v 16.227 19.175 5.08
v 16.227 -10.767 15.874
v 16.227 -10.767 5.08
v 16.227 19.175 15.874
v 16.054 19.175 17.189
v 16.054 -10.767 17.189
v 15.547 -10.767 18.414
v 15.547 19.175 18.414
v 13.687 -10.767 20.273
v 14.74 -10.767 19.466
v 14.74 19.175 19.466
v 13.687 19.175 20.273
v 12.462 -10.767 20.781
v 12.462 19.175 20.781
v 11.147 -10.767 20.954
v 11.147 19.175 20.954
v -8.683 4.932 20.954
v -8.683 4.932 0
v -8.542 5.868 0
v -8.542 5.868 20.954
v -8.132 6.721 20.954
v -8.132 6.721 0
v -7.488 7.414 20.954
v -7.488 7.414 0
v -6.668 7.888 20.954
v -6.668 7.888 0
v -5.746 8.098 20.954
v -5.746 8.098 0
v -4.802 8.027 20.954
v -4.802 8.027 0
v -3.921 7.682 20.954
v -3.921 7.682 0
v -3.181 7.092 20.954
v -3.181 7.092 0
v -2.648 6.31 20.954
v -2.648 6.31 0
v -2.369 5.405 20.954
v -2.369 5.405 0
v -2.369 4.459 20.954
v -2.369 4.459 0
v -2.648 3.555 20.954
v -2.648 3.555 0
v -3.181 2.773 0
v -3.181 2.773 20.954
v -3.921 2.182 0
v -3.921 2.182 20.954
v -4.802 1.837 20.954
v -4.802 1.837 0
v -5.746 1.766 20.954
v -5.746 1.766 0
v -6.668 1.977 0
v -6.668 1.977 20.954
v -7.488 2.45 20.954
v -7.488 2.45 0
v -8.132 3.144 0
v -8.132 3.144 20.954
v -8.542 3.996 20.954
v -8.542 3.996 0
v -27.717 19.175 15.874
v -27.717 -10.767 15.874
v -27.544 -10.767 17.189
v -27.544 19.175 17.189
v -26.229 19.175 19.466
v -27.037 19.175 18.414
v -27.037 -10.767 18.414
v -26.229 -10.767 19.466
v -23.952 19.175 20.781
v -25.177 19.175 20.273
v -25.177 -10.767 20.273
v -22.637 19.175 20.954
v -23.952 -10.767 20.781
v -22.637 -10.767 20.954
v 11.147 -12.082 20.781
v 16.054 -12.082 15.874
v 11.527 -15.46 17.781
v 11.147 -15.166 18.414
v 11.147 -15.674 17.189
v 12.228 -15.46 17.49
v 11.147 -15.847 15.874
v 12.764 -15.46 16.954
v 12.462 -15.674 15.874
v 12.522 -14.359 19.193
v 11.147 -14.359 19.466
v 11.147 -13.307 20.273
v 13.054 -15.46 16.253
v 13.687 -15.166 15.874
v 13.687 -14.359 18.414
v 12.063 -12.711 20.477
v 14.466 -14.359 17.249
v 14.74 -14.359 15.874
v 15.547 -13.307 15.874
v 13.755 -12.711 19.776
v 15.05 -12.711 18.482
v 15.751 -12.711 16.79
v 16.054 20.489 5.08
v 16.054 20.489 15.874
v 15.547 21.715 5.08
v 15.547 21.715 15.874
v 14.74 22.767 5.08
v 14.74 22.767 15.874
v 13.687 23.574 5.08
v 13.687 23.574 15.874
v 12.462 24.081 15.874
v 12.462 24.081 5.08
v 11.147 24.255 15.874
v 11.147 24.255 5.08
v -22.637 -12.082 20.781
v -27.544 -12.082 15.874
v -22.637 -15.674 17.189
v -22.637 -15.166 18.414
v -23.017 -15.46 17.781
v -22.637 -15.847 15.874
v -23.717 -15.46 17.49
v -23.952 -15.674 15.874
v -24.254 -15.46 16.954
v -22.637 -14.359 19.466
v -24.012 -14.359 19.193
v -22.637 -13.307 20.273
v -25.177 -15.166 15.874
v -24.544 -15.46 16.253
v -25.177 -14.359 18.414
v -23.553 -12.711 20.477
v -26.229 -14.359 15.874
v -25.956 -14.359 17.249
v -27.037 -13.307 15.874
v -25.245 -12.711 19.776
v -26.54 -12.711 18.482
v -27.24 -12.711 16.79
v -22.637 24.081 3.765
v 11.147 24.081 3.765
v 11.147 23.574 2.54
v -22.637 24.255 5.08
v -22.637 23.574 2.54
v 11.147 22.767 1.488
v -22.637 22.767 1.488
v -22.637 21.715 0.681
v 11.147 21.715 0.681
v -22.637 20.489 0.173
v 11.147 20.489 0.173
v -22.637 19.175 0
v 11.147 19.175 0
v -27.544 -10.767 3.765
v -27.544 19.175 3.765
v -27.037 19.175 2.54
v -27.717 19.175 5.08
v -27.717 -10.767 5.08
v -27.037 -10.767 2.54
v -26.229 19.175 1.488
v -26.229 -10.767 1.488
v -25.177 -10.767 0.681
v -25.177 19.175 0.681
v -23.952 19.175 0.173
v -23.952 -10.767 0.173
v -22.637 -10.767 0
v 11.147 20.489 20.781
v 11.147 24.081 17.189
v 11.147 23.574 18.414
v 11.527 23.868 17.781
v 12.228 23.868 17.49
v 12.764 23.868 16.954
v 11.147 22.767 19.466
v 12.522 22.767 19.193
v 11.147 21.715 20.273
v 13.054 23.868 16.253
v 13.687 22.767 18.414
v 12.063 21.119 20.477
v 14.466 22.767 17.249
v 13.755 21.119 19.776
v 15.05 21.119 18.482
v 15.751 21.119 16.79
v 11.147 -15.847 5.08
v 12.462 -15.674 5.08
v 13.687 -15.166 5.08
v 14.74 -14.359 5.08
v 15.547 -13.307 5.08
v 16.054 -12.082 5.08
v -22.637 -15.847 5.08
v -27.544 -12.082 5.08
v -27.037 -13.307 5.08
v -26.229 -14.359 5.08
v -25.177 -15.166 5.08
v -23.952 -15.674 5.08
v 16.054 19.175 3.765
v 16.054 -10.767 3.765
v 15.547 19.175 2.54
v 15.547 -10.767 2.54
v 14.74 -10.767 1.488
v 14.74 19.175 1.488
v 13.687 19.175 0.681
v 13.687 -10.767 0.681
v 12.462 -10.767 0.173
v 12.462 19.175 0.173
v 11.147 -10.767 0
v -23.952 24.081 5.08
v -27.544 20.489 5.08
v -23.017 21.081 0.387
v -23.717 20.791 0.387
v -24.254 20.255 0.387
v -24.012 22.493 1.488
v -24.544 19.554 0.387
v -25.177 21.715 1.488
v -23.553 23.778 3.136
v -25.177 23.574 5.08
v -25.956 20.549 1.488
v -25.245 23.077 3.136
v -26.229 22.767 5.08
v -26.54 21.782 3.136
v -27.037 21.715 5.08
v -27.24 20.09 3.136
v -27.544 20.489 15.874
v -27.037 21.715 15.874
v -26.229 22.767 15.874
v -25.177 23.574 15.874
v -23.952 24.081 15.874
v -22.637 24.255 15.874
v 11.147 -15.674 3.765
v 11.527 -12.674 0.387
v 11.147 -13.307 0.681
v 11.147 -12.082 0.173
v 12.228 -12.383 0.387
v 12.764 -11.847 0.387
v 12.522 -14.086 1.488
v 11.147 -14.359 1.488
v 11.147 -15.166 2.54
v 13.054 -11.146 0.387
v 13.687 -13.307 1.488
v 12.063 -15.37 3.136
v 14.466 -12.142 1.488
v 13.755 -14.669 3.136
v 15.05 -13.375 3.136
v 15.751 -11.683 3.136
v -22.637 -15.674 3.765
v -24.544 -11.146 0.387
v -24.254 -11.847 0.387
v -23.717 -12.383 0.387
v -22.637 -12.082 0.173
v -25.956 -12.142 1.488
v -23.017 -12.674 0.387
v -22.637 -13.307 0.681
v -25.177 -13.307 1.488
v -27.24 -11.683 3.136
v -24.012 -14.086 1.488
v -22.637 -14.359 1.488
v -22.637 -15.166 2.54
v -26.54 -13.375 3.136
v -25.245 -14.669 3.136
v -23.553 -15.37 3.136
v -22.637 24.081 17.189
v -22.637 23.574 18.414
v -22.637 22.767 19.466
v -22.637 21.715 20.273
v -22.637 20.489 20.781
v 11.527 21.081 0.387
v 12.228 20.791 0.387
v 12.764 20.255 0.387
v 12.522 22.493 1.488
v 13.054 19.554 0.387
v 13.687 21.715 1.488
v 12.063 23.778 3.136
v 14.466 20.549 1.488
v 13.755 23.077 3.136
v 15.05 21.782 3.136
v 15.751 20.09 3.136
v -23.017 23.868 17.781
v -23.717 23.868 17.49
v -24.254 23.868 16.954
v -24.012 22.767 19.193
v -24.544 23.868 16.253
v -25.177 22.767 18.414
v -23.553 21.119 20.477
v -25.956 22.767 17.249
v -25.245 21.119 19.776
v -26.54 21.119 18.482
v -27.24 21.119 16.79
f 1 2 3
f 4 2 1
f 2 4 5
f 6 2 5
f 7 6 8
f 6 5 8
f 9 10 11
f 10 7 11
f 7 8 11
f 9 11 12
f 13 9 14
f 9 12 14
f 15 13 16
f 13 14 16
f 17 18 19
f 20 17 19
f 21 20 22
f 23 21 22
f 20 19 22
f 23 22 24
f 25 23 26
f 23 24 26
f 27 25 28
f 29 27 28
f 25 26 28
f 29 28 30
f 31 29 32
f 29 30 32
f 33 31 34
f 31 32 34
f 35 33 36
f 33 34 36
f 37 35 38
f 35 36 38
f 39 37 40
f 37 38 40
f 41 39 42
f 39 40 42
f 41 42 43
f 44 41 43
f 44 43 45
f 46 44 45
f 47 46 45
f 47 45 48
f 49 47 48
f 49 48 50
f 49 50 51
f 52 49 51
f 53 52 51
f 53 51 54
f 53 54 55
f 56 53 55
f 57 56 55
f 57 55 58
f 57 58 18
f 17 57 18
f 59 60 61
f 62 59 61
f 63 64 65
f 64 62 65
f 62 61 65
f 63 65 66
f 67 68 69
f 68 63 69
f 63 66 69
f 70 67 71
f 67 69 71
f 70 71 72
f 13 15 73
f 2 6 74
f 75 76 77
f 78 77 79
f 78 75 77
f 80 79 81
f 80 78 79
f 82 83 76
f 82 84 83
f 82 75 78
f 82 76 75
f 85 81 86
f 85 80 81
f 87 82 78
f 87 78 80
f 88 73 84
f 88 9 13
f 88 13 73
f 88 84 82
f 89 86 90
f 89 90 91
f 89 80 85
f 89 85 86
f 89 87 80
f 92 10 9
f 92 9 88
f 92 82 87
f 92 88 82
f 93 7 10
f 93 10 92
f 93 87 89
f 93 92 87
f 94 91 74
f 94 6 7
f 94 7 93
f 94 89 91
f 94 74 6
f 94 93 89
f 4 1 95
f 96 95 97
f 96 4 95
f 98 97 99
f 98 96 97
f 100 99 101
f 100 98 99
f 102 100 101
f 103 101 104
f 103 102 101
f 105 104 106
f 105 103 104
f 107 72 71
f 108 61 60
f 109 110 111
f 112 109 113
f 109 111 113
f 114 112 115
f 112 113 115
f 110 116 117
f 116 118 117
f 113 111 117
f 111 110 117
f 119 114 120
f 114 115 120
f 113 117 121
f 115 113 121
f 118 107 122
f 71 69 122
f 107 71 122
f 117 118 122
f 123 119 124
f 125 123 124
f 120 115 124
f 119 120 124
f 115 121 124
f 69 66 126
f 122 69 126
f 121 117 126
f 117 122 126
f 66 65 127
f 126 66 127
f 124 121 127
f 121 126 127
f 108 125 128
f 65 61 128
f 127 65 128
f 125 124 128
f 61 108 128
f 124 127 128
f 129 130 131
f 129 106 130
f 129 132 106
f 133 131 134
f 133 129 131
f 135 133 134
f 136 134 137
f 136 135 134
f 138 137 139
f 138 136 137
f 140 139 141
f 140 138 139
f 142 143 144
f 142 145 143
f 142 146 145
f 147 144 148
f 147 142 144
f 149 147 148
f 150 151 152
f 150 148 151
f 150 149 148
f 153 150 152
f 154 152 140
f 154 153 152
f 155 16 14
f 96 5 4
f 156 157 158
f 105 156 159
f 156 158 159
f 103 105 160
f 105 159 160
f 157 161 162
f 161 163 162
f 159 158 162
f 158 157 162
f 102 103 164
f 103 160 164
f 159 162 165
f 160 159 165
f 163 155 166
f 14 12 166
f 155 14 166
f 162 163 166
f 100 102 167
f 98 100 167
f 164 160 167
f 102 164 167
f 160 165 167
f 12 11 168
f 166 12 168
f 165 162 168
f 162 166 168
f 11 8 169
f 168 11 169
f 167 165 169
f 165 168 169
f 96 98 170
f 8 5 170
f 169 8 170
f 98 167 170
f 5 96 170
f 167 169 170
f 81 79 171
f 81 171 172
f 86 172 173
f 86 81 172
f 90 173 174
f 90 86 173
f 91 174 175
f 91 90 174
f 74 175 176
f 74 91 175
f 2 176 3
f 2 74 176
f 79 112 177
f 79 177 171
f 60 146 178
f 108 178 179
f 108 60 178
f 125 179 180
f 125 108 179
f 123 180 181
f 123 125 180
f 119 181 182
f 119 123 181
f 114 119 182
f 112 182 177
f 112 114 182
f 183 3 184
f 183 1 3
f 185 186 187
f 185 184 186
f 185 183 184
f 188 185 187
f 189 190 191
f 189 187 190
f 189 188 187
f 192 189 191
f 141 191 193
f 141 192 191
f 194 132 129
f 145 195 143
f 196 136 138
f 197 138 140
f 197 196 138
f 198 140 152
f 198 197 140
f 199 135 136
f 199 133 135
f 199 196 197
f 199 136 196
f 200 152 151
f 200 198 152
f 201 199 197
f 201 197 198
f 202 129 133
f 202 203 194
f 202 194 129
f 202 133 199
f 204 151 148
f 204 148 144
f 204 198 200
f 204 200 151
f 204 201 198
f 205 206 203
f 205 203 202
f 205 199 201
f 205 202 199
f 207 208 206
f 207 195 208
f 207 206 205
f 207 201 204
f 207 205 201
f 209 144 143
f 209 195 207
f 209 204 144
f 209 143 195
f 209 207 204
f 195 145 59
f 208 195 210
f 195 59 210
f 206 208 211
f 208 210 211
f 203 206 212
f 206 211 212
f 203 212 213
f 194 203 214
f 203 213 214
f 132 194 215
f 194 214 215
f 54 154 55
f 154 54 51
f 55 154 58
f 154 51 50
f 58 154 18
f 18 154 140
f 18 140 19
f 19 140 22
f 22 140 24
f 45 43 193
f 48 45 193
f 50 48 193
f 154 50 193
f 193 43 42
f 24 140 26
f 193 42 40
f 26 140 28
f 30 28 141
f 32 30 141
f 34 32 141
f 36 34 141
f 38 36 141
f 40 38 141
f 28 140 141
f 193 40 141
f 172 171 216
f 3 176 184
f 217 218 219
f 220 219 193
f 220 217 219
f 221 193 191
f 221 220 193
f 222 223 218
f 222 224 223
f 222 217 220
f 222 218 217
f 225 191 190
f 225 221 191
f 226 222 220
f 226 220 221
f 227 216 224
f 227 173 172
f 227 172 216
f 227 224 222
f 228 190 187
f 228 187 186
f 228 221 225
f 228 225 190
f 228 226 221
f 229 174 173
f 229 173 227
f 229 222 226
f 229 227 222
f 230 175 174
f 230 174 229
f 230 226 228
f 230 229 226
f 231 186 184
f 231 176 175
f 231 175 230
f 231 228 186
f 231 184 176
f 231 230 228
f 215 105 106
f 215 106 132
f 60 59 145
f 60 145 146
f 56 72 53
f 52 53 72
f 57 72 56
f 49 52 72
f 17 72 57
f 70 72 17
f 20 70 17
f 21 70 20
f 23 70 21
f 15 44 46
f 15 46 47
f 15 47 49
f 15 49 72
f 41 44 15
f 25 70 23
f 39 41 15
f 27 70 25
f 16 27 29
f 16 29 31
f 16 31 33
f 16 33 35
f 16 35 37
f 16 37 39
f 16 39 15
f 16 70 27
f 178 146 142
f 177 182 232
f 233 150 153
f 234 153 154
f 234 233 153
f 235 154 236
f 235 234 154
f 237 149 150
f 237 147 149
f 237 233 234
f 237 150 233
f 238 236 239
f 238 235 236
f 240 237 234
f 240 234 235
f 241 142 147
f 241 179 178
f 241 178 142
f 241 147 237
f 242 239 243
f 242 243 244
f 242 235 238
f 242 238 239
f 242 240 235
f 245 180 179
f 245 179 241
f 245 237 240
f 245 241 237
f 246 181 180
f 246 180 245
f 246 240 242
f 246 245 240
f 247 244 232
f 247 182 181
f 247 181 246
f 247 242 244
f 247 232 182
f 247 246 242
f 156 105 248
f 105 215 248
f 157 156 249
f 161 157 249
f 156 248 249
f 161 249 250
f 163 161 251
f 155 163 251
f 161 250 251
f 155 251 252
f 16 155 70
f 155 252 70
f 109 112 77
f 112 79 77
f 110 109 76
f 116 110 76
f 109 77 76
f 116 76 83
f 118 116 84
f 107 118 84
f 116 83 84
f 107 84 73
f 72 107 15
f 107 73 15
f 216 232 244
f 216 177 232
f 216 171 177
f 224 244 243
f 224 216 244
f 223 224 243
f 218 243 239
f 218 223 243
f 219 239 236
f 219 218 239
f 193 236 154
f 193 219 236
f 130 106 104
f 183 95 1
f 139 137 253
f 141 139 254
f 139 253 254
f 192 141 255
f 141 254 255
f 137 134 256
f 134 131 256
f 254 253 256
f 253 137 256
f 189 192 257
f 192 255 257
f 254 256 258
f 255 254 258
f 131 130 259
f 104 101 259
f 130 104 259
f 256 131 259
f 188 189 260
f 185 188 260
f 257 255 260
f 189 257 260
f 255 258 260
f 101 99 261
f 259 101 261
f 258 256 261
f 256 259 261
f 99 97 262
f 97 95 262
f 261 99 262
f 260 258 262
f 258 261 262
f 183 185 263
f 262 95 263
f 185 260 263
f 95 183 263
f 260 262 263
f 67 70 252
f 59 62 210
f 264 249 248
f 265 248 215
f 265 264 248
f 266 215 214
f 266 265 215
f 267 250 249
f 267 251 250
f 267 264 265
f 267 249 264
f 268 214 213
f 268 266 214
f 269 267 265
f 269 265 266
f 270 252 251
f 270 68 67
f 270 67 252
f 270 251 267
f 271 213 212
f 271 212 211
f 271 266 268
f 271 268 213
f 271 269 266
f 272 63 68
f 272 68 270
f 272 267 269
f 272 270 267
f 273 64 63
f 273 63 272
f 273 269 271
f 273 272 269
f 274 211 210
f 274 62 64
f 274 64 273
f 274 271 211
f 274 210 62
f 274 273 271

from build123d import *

# Parameters (mm, degrees)
F0_W = 43.9448170364
F0_H = 40.1015970856
F3_R = 5.08
F5_D = 6.35


with BuildPart() as f2:
    # F2: sweep along a path in F1
    with BuildLine(Plane.XZ) as f2_path:
        Line((0, 0), (0, 20.9540724754))
    # F0 (on Top) → F2 (sweep)
    with BuildSketch(Plane.XY):
        with Locations((-5.7449191809, 4.2037246749)):
            Rectangle(F0_W, F0_H)
    sweep(path=f2_path.line)

    # F3
    f3_edges = [f2.edges().sort_by_distance(p)[0] for p in [
        (-27.717328, 4.203725, 20.954072),
        (16.227489, 4.203725, 20.954072),
        (-5.744919, 24.254523, 20.954072),
        (-5.744919, -15.847074, 20.954072),
        (16.227489, -15.847074, 10.477036),
        (-27.717328, -15.847074, 10.477036),
        (-27.717328, 24.254523, 10.477036),
        (16.227489, 24.254523, 10.477036),
        (-5.744919, 24.254523, 0),
        (-27.717328, 4.203725, 0),
        (-5.744919, -15.847074, 0),
        (16.227489, 4.203725, 0),
    ]]
    fillet(f3_edges, radius=F3_R)

    # F5 (through all)
    with Locations(Plane.XY.offset(20.9540724754)):
        with Locations((-5.5084819905, 4.9320813268)):
            Hole(F5_D / 2)


solid = f2.part
